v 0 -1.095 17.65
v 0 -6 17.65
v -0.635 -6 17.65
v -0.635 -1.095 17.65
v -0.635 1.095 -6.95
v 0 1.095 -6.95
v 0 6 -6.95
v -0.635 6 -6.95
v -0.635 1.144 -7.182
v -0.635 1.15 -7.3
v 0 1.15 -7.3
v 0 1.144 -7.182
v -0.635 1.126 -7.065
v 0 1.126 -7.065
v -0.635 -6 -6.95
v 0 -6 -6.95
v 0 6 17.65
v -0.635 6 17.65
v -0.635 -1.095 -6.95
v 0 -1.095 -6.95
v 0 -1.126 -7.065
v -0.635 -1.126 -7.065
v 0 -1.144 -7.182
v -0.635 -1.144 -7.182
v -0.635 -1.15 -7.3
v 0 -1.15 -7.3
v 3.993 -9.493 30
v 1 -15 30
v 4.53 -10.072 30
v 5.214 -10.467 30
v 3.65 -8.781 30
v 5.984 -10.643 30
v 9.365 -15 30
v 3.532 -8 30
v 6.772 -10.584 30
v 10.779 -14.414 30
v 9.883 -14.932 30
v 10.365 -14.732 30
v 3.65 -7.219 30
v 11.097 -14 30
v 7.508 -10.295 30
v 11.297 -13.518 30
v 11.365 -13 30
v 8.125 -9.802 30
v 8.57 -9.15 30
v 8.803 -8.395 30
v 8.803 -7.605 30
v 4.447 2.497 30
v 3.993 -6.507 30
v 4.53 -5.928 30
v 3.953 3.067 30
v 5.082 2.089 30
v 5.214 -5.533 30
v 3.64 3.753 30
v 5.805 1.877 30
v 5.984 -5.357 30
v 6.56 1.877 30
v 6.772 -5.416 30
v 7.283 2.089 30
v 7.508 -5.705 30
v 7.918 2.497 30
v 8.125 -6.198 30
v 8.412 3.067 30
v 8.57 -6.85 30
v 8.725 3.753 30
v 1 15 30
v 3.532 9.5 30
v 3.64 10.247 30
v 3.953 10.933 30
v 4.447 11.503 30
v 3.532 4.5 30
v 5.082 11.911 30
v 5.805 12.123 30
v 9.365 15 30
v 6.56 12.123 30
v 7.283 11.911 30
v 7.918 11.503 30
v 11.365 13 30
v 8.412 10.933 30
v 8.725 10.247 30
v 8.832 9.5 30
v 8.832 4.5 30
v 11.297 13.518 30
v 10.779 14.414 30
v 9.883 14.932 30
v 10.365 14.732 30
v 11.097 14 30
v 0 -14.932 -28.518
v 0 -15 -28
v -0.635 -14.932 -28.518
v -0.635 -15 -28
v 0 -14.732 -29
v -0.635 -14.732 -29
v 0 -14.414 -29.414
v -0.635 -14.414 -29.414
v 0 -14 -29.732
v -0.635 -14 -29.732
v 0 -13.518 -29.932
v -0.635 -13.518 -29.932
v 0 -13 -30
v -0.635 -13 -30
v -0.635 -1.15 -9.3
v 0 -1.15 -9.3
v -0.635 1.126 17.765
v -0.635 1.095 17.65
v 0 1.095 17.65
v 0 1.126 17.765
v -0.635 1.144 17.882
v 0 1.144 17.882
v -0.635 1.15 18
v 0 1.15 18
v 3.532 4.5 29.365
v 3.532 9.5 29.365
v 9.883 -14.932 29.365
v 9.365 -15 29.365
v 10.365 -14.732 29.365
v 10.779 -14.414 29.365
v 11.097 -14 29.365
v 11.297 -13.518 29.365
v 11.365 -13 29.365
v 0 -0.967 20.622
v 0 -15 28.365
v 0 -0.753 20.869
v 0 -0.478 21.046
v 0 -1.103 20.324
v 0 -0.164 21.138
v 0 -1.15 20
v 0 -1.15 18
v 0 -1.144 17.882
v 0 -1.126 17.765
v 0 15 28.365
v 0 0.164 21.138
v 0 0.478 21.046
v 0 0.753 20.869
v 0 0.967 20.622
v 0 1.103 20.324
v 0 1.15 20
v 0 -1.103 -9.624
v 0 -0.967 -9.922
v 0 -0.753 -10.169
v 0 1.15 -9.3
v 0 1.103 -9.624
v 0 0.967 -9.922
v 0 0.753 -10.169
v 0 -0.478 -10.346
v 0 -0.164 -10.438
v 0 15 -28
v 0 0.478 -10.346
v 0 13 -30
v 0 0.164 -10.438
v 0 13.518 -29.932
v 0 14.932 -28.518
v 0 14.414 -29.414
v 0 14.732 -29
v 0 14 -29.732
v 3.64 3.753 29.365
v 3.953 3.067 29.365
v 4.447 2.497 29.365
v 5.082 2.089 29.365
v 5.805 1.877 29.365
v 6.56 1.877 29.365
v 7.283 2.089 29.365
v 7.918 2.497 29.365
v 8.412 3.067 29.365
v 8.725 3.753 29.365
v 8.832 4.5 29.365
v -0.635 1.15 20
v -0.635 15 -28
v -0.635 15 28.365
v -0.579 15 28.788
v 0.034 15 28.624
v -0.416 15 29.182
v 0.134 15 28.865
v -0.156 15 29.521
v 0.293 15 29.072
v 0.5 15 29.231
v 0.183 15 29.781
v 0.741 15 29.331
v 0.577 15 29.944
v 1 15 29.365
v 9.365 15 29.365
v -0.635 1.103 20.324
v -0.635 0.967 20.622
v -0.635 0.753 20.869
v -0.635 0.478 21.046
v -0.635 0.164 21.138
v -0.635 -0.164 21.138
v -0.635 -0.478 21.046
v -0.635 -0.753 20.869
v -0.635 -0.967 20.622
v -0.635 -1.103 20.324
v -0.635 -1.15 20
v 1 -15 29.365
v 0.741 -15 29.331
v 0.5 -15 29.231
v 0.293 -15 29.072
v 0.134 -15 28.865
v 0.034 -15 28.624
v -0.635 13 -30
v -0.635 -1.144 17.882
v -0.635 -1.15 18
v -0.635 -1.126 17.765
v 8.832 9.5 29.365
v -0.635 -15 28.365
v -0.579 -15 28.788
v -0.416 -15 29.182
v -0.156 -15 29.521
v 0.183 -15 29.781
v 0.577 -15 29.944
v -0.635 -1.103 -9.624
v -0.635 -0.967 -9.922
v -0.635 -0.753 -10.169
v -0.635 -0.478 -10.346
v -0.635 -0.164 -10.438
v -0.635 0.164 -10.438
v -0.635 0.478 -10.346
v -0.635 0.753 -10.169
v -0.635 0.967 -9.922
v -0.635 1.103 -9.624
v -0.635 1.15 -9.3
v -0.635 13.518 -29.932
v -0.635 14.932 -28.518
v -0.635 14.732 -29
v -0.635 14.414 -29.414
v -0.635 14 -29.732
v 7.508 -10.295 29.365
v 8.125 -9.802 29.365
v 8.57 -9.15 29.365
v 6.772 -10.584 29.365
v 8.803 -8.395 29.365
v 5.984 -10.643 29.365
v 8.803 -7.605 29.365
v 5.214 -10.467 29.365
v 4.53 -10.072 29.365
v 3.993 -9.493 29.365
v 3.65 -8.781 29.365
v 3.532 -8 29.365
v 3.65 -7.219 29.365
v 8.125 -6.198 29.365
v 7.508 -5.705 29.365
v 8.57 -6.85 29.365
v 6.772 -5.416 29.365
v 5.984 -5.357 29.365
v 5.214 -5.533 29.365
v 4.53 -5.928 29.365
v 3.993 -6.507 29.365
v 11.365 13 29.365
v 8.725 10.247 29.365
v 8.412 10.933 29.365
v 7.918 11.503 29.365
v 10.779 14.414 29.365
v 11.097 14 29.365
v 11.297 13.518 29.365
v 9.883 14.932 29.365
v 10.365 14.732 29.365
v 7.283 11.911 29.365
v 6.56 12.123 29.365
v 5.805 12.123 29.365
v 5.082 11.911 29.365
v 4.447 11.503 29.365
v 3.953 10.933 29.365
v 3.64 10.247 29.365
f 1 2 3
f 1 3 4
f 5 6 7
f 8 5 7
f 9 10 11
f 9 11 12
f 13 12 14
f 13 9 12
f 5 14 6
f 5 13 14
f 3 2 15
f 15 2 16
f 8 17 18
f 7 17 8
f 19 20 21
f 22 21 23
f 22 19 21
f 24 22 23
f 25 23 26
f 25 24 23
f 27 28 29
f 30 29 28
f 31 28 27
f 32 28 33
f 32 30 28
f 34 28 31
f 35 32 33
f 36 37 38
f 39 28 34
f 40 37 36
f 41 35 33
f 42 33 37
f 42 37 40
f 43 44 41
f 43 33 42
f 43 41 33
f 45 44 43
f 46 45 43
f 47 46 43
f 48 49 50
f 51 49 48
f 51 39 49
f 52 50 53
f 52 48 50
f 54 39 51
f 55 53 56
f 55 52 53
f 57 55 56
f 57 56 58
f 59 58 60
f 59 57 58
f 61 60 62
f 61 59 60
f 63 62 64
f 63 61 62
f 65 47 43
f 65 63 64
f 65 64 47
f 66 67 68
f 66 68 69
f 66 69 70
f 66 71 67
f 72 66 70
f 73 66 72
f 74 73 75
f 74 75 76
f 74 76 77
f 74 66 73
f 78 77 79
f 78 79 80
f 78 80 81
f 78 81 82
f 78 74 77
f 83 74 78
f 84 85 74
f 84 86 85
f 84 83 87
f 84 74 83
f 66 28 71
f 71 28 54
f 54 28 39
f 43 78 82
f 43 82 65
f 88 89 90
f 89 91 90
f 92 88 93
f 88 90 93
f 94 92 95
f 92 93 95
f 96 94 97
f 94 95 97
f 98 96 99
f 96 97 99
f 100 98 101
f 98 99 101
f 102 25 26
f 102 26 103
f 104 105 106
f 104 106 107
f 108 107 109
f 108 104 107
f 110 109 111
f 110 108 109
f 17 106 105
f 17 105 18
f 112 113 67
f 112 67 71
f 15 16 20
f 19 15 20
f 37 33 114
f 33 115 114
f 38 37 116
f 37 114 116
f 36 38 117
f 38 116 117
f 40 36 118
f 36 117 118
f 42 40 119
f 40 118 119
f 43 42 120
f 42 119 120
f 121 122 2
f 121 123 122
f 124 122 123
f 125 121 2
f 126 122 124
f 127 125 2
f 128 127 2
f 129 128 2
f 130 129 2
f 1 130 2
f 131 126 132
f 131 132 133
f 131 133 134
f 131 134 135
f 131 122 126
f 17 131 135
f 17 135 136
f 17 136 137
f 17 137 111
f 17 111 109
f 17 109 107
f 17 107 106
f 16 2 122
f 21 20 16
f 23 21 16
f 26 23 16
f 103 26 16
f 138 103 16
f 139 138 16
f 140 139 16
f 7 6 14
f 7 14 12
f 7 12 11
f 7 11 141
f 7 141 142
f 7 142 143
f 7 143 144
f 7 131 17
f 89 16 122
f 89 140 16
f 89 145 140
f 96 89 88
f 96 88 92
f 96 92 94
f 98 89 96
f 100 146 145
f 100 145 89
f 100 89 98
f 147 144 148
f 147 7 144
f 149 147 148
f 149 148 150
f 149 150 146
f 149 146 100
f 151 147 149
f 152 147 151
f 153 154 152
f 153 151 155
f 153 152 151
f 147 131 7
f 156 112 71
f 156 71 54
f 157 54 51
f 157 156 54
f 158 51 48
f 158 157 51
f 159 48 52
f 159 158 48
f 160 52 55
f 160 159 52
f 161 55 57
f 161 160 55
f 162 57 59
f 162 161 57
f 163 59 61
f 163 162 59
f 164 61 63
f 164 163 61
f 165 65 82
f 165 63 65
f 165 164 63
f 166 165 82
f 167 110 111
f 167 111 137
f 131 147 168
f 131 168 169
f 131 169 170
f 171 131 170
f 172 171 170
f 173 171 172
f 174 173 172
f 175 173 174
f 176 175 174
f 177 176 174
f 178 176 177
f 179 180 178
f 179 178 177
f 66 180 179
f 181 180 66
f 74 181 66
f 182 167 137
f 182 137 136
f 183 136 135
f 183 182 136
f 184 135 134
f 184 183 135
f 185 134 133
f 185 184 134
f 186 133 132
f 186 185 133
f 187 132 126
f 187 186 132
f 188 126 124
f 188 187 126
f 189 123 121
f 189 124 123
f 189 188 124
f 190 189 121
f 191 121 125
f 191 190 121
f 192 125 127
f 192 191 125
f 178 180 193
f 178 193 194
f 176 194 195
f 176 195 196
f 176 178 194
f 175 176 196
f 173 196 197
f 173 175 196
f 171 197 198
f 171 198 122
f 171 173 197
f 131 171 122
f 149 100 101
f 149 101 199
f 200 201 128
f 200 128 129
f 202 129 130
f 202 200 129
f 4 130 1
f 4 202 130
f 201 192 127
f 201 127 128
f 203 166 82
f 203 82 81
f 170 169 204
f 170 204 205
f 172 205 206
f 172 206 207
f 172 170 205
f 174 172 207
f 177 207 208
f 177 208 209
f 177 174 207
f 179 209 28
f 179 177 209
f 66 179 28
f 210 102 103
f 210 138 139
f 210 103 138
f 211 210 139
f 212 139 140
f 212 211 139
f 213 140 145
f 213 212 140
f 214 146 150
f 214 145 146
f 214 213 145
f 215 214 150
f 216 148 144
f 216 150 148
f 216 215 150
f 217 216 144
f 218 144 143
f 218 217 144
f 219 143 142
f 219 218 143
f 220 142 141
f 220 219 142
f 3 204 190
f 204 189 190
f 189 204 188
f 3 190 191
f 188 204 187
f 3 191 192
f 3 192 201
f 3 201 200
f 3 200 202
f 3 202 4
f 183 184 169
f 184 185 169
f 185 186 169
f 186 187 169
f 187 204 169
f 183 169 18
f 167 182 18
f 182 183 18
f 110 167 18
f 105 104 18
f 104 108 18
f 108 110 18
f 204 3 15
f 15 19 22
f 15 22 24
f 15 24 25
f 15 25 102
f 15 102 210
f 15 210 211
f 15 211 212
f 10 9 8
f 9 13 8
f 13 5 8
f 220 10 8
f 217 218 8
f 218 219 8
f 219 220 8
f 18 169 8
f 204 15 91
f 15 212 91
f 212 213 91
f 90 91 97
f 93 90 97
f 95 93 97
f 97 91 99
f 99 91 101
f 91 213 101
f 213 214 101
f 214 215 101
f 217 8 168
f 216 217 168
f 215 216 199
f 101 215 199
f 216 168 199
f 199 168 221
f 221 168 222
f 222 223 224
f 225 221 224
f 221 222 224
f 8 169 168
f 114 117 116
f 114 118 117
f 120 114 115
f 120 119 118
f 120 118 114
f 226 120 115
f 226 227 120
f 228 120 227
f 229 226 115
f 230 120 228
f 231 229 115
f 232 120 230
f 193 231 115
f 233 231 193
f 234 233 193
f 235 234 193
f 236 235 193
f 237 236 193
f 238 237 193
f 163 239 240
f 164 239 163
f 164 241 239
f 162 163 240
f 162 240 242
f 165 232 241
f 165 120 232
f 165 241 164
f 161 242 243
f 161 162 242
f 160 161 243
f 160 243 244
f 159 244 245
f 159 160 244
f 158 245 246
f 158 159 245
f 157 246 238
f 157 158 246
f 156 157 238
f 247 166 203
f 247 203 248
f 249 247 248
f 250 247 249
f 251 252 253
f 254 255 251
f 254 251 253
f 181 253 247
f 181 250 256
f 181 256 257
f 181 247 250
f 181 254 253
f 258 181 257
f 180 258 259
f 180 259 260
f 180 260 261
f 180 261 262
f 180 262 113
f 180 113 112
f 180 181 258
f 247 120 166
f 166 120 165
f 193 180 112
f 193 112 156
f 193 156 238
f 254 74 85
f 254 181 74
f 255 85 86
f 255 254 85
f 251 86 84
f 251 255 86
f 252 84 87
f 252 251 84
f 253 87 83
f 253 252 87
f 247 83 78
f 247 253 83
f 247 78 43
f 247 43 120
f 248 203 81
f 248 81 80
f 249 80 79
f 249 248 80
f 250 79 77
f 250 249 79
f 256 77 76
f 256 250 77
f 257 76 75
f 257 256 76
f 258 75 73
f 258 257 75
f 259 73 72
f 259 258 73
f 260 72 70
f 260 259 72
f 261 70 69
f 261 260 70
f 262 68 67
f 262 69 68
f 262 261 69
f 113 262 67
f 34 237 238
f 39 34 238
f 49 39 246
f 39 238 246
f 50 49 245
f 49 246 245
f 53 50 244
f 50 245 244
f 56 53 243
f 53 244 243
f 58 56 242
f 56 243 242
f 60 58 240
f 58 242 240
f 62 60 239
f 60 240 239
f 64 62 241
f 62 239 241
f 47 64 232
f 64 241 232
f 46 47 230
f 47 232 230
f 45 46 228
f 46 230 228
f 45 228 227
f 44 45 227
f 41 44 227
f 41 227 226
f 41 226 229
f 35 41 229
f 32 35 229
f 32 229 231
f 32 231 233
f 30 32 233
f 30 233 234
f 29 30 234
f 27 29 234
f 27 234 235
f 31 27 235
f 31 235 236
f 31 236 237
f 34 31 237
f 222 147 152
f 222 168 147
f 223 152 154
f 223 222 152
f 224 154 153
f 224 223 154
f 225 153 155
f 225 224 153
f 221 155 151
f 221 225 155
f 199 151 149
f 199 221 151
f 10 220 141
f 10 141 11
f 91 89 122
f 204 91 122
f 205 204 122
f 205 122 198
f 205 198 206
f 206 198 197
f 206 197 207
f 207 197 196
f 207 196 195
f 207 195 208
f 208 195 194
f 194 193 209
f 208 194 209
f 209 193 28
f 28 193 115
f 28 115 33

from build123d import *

# Parameters (mm, degrees)
SKETCH1_W                    = 60
SKETCH1_H                    = 30
BASE_FLANGE1_DEPTH           = 0.635
SKETCH9_W                    = 24.6
SKETCH9_H                    = 12
CUT_EXTRUDE1_DEPTH           = 34.547030047
CUT_EXTRUDE2_DEPTH           = 34.547030047
EDGE_FLANGE1_STRIP_W         = 4.54
EDGE_FLANGE1_STRIP_H         = 0.635
EDGE_FLANGE1_STRIP_CUT_DEPTH = 30
EDGE_FLANGE1_DEPTH           = 30
SKETCH14_R                   = 2.65
CUT_EXTRUDE3_DEPTH           = 63.276532097
FILLET1_R                    = 2


# Sheet-metal steps are written as plain solids
with BuildPart() as part:
    # Sketch1 → Base-Flange1 (new body)
    with BuildSketch(Plane(origin=(0, 0, 0), x_dir=(0, 0, -1), z_dir=(1, 0, 0))):
        Rectangle(SKETCH1_W, SKETCH1_H)
    extrude(amount=-BASE_FLANGE1_DEPTH)

    # Sketch9 → Cut-Extrude1 (cut, through all)
    with BuildSketch(Plane(origin=(0, 0, 0), x_dir=(0, 0, -1), z_dir=(1, 0, 0))):
        with Locations((-5.35, 0)):
            Rectangle(SKETCH9_W, SKETCH9_H)
    extrude(amount=-CUT_EXTRUDE1_DEPTH, mode=Mode.SUBTRACT)

    # Sketch10 → Cut-Extrude2 (cut, through all)
    with BuildSketch(Plane.ZY.offset(0.635)):
        with BuildLine():
            Line((-9.3, 1.15), (-7.3, 1.15))
            ThreePointArc((-7.3, 1.15), (-6.15, 0), (-7.3, -1.15))
            Line((-7.3, -1.15), (-9.3, -1.15))
            ThreePointArc((-9.3, -1.15), (-10.45, 0), (-9.3, 1.15))
        make_face()
        with BuildLine():
            Line((18, 1.15), (20, 1.15))
            ThreePointArc((20, 1.15), (21.15, 0), (20, -1.15))
            Line((20, -1.15), (18, -1.15))
            ThreePointArc((18, -1.15), (16.85, 0), (18, 1.15))
        make_face()
    extrude(amount=-CUT_EXTRUDE2_DEPTH, mode=Mode.SUBTRACT)

    # Edge-Flange1 strip (across the edge) → Edge-Flange1 strip cut (cut)
    with BuildSketch(Plane(origin=(0, 15, 30), x_dir=(0, 0, -1), z_dir=(0, -1, 0))):
        with Locations((-0.635, -0.3175)):
            Rectangle(EDGE_FLANGE1_STRIP_W, EDGE_FLANGE1_STRIP_H)
    extrude(amount=EDGE_FLANGE1_STRIP_CUT_DEPTH, mode=Mode.SUBTRACT)

    # Edge-Flange1 section (across the edge) → Edge-Flange1 (add)
    with BuildSketch(Plane(origin=(0, 15, 30), x_dir=(0, 0, -1), z_dir=(0, -1, 0))):
        with BuildLine():
            Line((0, 1), (0, 11.365))
            Line((0, 11.365), (0.635, 11.365))
            Line((0.635, 11.365), (0.635, 1))
            ThreePointArc((0.635, 1), (0.927893219, 0.292893219), (1.635, 0))
            Line((1.635, 0), (1.635, -0.635))
            ThreePointArc((1.635, -0.635), (0.478880413, -0.156119587), (0, 1))
        make_face()
    extrude(amount=EDGE_FLANGE1_DEPTH)

    # Sketch14 → Cut-Extrude3 (cut, through all)
    with BuildSketch(Plane(origin=(0, 0, 29.365), x_dir=(-1, 0, 0), z_dir=(0, 0, -1))):
        with Locations((-6.1825, -8)):
            Circle(SKETCH14_R)
        with BuildLine():
            Line((-8.8325, 4.5), (-8.8325, 9.5))
            ThreePointArc((-8.8325, 9.5), (-6.1825, 12.15), (-3.5325, 9.5))
            Line((-3.5325, 9.5), (-3.5325, 4.5))
            ThreePointArc((-3.5325, 4.5), (-6.1825, 1.85), (-8.8325, 4.5))
        make_face()
    extrude(amount=-CUT_EXTRUDE3_DEPTH, mode=Mode.SUBTRACT)

    # Fillet1
    fillet1_edges = [part.edges().sort_by_distance(p)[0] for p in [
        (11.365, 15, 29.6825),
        (11.365, -15, 29.6825),
        (-0.3175, -15, -30),
        (-0.3175, 15, -30),
    ]]
    fillet(fillet1_edges, radius=FILLET1_R)


solid = part.part
